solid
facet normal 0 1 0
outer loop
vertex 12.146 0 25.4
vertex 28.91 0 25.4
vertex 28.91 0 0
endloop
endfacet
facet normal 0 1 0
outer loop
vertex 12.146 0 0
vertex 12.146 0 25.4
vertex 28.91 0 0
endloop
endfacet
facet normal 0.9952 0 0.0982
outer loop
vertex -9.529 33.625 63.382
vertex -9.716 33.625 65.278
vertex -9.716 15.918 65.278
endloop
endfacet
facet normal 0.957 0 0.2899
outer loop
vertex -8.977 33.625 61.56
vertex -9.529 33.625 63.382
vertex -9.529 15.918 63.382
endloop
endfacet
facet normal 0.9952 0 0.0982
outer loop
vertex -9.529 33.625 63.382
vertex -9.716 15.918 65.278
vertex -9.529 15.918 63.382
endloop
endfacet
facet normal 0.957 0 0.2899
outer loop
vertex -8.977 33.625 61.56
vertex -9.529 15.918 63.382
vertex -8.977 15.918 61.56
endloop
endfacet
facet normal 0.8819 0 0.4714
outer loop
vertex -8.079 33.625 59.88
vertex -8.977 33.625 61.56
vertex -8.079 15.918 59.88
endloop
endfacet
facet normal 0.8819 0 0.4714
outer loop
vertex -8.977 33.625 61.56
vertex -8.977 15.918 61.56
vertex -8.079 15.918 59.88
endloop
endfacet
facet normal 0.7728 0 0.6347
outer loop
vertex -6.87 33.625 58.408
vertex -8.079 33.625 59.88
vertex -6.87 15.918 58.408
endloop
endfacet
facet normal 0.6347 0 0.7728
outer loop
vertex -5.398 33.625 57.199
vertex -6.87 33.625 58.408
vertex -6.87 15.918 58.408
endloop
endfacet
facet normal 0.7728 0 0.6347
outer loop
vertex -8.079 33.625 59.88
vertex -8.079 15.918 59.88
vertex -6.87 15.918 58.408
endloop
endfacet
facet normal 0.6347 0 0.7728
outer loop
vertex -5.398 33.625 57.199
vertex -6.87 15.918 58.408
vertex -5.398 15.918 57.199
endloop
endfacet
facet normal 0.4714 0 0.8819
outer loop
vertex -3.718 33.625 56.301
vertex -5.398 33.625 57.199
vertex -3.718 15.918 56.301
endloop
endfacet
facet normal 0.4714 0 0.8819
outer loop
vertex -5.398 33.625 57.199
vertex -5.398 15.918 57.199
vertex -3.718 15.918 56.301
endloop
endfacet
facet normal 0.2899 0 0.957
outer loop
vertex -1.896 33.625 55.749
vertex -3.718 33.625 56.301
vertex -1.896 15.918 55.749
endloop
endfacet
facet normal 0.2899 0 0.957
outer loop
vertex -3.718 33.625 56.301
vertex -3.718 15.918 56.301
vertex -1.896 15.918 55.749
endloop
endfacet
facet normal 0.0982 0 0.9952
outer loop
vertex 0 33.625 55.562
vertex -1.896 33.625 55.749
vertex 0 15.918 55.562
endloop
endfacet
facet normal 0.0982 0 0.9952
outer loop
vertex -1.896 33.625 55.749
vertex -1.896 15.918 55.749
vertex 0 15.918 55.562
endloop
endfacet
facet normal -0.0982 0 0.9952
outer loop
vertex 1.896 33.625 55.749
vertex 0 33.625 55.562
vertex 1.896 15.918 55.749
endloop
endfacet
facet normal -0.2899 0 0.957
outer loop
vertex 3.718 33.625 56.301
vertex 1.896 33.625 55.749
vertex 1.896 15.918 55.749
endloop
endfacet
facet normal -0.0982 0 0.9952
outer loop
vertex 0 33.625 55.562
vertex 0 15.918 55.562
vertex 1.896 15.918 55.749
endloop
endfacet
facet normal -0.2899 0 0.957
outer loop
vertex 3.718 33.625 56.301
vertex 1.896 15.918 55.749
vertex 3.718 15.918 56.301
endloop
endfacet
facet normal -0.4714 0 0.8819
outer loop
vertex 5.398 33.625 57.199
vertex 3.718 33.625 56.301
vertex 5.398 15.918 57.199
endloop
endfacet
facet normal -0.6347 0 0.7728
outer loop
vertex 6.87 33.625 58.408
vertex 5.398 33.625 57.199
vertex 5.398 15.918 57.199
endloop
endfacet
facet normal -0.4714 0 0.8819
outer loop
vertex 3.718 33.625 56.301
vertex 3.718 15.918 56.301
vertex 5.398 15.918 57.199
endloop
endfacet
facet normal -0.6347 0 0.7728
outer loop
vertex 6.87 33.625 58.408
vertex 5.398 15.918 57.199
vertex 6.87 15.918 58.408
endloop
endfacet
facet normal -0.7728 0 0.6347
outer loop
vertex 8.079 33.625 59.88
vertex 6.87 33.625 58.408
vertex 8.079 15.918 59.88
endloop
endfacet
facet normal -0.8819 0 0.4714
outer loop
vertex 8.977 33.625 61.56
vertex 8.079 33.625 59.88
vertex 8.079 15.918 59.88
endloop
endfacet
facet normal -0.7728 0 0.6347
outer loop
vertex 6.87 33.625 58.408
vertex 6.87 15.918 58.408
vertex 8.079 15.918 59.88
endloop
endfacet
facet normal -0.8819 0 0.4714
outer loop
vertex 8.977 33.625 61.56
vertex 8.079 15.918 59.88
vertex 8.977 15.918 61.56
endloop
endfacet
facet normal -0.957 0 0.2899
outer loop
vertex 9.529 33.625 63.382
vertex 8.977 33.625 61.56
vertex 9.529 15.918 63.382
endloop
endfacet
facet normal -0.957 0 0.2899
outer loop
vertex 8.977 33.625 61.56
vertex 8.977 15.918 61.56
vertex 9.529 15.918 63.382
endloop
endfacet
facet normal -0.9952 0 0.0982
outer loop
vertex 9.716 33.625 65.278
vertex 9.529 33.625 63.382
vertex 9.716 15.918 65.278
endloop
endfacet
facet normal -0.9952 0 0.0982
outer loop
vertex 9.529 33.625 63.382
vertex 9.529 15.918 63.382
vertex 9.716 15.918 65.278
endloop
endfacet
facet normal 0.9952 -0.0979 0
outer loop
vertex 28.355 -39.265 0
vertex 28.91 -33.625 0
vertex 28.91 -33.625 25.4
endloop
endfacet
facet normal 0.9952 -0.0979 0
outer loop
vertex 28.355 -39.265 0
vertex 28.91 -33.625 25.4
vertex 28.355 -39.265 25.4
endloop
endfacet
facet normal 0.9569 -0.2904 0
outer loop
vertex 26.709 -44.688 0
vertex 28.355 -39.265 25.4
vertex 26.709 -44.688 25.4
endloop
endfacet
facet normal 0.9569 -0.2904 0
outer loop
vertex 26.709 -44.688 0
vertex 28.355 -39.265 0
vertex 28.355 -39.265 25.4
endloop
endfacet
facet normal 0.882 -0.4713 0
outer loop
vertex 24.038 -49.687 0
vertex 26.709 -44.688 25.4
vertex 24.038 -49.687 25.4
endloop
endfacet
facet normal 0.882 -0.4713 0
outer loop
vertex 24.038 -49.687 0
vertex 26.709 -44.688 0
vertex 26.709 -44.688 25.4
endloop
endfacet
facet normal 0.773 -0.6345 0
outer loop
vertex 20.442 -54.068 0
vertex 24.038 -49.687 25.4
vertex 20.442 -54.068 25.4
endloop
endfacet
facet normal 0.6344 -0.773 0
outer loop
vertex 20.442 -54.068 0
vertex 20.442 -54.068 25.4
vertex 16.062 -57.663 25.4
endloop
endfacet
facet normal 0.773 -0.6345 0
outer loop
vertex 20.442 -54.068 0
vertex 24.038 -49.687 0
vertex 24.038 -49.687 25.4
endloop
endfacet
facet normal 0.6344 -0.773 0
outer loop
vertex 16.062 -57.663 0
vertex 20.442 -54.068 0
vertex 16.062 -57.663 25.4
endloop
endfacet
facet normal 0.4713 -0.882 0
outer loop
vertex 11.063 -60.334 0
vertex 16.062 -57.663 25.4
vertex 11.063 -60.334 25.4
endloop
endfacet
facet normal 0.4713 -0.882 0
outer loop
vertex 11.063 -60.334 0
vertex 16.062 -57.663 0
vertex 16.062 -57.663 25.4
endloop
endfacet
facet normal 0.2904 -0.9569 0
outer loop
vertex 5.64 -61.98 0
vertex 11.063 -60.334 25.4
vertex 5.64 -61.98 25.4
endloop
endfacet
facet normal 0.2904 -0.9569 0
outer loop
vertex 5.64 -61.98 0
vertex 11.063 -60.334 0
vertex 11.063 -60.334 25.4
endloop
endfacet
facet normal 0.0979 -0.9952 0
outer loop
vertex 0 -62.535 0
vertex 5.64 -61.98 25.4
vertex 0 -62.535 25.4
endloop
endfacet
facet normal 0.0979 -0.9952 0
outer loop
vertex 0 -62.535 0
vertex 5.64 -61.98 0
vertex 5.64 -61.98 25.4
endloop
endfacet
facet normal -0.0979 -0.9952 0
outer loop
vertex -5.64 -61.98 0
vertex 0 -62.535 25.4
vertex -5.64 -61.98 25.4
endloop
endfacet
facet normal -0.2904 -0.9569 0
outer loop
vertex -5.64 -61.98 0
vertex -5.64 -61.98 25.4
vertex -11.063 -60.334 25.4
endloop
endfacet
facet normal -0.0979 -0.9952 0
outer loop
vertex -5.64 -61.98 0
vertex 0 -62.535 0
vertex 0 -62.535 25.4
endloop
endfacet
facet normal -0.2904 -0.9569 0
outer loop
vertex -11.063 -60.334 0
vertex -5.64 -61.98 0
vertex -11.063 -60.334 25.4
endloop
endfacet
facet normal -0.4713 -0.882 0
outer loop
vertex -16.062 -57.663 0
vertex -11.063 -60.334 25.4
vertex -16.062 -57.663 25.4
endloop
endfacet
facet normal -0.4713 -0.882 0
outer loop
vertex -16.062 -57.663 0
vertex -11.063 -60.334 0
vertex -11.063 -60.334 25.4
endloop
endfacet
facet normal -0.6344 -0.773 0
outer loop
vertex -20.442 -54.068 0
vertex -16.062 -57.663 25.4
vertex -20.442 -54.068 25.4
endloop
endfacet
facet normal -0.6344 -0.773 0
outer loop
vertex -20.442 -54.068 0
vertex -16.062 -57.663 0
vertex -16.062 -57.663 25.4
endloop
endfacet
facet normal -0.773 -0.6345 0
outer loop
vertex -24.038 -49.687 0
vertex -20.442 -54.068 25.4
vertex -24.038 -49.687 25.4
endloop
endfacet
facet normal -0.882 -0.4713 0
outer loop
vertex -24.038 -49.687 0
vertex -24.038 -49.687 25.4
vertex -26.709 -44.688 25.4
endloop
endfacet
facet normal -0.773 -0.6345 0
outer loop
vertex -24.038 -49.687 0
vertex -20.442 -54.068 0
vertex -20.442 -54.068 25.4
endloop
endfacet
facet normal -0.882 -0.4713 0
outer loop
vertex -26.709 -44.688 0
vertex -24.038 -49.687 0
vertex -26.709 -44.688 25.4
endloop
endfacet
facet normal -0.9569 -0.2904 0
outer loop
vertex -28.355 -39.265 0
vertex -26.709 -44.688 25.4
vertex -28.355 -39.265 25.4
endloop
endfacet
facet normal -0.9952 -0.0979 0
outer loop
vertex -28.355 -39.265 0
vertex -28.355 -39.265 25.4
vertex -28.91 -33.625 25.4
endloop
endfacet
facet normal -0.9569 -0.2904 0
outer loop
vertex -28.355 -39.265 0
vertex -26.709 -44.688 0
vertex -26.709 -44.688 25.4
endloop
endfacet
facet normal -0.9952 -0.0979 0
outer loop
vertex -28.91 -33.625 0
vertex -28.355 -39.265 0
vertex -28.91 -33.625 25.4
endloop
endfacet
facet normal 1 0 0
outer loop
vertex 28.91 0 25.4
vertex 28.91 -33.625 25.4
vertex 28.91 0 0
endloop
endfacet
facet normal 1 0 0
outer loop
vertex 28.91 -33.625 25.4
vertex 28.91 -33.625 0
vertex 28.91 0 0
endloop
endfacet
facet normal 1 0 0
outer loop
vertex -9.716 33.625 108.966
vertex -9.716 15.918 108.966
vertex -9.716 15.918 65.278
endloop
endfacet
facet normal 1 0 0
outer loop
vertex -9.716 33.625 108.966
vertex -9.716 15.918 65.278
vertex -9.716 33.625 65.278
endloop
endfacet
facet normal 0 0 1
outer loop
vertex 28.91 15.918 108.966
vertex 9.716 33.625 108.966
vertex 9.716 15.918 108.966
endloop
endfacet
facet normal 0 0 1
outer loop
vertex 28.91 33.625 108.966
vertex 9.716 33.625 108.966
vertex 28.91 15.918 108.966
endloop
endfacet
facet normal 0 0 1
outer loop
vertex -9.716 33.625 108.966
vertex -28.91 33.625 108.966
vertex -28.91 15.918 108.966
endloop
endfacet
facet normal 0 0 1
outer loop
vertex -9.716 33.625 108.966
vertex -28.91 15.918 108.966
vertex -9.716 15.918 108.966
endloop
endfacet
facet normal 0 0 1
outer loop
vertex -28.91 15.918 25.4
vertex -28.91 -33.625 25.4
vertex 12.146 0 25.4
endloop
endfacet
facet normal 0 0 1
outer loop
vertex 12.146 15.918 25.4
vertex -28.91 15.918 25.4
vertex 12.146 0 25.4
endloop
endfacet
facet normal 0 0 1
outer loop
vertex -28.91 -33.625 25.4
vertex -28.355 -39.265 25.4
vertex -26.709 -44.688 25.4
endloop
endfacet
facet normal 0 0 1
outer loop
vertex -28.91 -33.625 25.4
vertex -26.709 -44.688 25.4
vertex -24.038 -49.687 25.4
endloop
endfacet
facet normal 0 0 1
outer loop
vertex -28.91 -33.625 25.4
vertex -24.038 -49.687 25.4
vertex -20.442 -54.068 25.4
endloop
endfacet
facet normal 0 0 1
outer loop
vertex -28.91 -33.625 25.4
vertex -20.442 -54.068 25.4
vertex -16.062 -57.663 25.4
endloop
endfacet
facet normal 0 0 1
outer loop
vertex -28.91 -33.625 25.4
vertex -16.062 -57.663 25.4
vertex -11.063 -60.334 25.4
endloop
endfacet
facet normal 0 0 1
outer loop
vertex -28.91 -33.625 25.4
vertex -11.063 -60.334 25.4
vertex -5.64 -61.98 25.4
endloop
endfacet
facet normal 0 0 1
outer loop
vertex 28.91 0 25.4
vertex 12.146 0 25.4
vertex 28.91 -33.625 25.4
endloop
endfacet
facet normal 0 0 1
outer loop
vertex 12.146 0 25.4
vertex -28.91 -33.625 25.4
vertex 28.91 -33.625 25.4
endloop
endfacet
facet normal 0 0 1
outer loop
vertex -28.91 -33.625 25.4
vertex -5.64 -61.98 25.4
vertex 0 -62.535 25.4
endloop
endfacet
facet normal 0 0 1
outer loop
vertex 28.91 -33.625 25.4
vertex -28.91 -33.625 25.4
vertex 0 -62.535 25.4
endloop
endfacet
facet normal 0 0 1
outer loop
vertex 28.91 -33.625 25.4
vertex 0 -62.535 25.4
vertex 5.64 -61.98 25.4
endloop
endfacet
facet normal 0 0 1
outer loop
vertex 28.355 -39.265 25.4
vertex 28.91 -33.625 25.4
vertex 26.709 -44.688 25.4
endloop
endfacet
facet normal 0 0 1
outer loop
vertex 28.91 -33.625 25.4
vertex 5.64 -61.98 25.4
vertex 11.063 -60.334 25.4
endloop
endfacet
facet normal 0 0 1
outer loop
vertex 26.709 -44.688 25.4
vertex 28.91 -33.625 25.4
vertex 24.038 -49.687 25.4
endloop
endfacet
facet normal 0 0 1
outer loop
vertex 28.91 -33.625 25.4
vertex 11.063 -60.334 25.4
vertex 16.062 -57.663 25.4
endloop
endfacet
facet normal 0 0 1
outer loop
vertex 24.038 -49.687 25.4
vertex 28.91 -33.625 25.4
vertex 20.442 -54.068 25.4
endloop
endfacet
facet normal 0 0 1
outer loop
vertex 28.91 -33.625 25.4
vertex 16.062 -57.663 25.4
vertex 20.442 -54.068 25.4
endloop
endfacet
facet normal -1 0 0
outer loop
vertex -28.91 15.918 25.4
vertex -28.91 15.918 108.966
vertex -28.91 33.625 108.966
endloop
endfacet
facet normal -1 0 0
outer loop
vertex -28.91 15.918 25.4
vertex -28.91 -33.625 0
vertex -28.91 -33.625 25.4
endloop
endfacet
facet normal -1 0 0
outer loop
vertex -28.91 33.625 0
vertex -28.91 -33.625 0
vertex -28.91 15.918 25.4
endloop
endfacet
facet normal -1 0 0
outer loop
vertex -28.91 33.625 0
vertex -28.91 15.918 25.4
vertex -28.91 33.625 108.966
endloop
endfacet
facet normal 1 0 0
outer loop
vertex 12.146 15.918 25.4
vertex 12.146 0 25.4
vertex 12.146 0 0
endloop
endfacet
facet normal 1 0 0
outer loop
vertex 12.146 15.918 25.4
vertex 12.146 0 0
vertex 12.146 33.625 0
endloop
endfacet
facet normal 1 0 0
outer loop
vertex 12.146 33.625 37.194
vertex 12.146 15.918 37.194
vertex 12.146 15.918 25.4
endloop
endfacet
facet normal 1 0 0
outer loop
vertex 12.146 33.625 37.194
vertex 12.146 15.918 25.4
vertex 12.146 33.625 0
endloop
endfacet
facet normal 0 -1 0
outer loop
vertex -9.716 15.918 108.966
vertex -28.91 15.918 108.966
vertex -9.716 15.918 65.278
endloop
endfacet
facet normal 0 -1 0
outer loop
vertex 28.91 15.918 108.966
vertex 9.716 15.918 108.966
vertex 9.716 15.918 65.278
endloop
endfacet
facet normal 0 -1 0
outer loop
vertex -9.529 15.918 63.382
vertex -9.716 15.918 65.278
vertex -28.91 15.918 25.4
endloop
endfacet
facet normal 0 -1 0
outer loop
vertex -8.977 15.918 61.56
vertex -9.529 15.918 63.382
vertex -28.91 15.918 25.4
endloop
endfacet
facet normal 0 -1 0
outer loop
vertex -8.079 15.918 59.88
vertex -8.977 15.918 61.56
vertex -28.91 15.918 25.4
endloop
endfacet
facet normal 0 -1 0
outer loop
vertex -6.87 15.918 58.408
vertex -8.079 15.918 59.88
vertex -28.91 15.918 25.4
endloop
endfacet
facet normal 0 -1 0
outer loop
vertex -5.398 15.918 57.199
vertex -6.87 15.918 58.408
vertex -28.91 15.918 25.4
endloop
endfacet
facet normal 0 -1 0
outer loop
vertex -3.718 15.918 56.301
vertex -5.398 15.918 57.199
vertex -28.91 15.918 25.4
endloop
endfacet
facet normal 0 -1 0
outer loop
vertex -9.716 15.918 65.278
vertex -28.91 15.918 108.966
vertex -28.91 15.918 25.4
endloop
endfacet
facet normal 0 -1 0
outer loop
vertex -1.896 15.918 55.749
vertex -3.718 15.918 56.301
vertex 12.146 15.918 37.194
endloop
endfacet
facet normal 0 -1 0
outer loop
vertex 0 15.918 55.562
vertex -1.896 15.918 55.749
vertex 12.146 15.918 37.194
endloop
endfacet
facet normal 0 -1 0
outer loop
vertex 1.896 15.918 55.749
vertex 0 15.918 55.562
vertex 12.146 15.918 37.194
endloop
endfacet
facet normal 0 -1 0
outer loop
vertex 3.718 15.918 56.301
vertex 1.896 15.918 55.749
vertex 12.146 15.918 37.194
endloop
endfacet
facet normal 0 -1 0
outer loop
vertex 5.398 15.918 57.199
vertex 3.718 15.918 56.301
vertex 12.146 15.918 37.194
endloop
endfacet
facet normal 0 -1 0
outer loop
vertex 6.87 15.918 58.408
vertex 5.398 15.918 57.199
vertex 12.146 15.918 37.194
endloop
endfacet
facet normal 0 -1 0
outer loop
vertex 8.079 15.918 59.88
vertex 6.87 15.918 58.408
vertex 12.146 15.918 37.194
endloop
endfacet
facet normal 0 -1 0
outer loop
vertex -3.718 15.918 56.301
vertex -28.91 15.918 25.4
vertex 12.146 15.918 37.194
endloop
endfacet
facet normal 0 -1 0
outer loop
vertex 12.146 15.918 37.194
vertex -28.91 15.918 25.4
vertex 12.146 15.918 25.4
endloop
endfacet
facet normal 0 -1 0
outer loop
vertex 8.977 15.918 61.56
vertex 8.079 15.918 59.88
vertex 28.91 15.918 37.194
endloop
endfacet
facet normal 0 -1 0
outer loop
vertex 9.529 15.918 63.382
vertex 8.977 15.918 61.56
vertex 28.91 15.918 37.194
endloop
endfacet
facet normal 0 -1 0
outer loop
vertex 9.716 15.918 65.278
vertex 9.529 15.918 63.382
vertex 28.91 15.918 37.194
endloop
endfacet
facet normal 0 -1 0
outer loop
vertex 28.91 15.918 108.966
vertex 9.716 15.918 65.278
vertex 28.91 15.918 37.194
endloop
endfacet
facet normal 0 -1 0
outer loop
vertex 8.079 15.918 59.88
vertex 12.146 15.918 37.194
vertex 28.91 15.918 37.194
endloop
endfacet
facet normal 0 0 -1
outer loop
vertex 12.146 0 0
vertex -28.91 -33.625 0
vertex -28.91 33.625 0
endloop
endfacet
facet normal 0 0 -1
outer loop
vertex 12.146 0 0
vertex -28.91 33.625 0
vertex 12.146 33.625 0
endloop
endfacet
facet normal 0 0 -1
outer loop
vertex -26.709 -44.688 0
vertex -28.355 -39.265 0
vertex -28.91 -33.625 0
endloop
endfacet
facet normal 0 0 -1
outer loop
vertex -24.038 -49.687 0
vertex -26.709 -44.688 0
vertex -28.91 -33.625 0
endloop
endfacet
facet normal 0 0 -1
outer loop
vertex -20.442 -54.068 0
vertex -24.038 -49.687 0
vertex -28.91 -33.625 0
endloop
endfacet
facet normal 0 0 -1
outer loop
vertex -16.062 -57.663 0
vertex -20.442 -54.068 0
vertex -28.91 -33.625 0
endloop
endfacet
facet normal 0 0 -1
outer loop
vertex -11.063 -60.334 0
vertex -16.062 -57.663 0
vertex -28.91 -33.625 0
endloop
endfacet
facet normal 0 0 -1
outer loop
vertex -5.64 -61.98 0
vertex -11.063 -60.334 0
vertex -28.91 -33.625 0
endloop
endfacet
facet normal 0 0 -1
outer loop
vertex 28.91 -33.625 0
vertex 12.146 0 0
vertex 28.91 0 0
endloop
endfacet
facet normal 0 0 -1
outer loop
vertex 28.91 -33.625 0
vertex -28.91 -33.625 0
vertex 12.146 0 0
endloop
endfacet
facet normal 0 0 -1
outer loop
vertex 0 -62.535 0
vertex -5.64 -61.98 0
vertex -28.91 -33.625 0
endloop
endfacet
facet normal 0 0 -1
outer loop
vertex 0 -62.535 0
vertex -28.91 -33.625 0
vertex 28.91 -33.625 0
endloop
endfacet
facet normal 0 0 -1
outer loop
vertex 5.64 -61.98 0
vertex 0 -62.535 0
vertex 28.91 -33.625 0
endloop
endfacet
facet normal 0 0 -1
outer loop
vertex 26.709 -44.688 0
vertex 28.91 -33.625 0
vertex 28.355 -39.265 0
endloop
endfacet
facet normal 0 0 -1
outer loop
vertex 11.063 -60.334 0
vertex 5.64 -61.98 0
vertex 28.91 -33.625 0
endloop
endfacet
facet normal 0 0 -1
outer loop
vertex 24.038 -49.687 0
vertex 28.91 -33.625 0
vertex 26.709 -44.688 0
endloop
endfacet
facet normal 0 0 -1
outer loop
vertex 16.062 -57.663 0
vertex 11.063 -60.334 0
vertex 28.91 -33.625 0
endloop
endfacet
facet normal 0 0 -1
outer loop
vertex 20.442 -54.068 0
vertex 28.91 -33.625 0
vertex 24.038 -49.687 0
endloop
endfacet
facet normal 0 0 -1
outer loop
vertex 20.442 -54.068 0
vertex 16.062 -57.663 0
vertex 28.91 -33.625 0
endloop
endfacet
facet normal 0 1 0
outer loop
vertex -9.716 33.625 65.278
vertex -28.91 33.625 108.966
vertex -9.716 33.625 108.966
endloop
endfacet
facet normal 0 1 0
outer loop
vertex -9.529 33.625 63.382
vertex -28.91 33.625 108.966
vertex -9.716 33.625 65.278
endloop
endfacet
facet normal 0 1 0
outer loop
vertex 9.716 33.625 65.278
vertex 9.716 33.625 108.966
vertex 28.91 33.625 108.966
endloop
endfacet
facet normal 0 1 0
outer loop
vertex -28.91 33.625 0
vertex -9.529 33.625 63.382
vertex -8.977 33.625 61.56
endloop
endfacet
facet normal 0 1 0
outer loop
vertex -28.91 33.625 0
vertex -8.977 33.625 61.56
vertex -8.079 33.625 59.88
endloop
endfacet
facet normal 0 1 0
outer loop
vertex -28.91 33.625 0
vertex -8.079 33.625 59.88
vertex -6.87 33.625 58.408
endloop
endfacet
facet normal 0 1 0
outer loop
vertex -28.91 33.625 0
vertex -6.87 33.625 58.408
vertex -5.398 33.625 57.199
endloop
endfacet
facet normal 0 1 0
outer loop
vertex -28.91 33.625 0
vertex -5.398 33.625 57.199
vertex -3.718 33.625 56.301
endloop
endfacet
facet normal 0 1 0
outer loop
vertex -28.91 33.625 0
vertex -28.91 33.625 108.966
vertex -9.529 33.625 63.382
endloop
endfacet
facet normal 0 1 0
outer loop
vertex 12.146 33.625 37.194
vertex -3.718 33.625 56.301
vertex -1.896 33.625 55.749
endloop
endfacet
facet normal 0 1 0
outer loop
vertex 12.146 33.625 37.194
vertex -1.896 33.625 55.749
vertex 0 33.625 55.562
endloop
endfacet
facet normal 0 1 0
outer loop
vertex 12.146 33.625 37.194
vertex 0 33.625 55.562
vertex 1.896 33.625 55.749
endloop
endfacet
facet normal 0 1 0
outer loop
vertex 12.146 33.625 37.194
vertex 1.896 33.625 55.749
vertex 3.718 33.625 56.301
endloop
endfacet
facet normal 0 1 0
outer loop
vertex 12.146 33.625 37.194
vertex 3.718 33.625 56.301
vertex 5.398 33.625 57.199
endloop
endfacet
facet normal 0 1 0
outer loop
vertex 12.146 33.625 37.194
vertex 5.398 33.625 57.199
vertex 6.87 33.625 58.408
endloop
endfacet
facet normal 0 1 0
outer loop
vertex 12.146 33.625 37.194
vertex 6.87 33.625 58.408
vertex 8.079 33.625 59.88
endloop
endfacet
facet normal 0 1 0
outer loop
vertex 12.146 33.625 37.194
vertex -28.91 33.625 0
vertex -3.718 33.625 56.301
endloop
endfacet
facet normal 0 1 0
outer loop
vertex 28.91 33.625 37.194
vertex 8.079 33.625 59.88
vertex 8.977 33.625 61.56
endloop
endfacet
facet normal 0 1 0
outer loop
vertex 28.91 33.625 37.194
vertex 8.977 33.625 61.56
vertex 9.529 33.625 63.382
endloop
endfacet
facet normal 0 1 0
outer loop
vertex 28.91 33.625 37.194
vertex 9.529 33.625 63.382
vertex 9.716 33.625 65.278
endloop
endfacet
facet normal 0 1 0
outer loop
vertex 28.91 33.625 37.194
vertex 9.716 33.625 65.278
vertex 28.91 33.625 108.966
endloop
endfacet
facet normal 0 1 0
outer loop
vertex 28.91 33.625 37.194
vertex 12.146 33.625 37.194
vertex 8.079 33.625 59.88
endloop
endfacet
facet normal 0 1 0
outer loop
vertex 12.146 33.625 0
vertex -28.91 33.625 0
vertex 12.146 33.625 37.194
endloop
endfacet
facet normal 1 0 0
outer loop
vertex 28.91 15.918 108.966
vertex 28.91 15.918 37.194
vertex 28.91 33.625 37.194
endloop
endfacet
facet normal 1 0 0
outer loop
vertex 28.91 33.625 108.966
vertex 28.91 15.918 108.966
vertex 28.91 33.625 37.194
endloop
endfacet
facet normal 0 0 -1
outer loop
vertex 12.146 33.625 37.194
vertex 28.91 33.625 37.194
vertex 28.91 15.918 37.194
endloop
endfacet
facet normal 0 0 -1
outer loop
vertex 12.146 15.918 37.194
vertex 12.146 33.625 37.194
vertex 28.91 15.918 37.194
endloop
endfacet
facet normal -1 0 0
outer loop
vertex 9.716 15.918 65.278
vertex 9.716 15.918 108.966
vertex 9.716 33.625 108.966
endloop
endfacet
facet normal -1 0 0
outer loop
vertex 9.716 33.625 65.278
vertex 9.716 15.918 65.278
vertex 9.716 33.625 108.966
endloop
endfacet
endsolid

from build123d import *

# Parameters (mm, degrees)
F0_W      = 57.8200779855
F0_H      = 67.2501921654
F1_DEPTH  = 25.4
F2_W      = 57.8200779855
F2_H      = 17.7068114281
F3_DEPTH  = 83.566
F4_W      = 19.4322280586
F4_H      = 20.8092816174
F5_DEPTH  = 43.688
F6_R      = 9.7161140293
F7_DEPTH  = 25.4
F9_DEPTH  = 16.764
F10_R     = 28.9100389928
F11_DEPTH = 25.4


with BuildPart() as f1:
    # F0 (on Top) → F1 (new body)
    with BuildSketch(Plane.XY):
        Rectangle(F0_W, F0_H)
    extrude(amount=F1_DEPTH)

    # F2 (on face) → F3 (join)
    with BuildSketch(Plane.XY.offset(25.4)):
        with Locations((0, 24.7716903687)):
            Rectangle(F2_W, F2_H)
    extrude(amount=F3_DEPTH)

    # F4 (on face) → F5 (cut)
    with BuildSketch(Plane.XY.offset(108.966)):
        with Locations((0, 26.3229254633)):
            Rectangle(F4_W, F4_H)
    extrude(amount=-F5_DEPTH, mode=Mode.SUBTRACT)

    # F6 (on face) → F7 (cut)
    with BuildSketch(Plane.XZ.offset(-15.9182846546)):
        with Locations((0, 65.278)):
            Circle(F6_R)
    extrude(amount=-F7_DEPTH, mode=Mode.SUBTRACT)

    # F8 (on face) → F9 (cut)
    with BuildSketch(Plane.YZ.offset(28.9100389928)):
        Polygon((15.9182846546, 25.4), (0, 25.4), (0, 0), (33.6250960827, 0), (33.6250960827, 37.1936224401), (15.9182846546, 37.1936224401), align=None)
    extrude(amount=-F9_DEPTH, mode=Mode.SUBTRACT)

    # F10 (on face) → F11 (join)
    with BuildSketch(Plane(origin=(0, 0, 0), x_dir=(1, 0, 0), z_dir=(0, 0, -1))):
        with Locations((0, 33.6250960827)):
            Circle(F10_R)
    extrude(amount=-F11_DEPTH)


solid = f1.part
